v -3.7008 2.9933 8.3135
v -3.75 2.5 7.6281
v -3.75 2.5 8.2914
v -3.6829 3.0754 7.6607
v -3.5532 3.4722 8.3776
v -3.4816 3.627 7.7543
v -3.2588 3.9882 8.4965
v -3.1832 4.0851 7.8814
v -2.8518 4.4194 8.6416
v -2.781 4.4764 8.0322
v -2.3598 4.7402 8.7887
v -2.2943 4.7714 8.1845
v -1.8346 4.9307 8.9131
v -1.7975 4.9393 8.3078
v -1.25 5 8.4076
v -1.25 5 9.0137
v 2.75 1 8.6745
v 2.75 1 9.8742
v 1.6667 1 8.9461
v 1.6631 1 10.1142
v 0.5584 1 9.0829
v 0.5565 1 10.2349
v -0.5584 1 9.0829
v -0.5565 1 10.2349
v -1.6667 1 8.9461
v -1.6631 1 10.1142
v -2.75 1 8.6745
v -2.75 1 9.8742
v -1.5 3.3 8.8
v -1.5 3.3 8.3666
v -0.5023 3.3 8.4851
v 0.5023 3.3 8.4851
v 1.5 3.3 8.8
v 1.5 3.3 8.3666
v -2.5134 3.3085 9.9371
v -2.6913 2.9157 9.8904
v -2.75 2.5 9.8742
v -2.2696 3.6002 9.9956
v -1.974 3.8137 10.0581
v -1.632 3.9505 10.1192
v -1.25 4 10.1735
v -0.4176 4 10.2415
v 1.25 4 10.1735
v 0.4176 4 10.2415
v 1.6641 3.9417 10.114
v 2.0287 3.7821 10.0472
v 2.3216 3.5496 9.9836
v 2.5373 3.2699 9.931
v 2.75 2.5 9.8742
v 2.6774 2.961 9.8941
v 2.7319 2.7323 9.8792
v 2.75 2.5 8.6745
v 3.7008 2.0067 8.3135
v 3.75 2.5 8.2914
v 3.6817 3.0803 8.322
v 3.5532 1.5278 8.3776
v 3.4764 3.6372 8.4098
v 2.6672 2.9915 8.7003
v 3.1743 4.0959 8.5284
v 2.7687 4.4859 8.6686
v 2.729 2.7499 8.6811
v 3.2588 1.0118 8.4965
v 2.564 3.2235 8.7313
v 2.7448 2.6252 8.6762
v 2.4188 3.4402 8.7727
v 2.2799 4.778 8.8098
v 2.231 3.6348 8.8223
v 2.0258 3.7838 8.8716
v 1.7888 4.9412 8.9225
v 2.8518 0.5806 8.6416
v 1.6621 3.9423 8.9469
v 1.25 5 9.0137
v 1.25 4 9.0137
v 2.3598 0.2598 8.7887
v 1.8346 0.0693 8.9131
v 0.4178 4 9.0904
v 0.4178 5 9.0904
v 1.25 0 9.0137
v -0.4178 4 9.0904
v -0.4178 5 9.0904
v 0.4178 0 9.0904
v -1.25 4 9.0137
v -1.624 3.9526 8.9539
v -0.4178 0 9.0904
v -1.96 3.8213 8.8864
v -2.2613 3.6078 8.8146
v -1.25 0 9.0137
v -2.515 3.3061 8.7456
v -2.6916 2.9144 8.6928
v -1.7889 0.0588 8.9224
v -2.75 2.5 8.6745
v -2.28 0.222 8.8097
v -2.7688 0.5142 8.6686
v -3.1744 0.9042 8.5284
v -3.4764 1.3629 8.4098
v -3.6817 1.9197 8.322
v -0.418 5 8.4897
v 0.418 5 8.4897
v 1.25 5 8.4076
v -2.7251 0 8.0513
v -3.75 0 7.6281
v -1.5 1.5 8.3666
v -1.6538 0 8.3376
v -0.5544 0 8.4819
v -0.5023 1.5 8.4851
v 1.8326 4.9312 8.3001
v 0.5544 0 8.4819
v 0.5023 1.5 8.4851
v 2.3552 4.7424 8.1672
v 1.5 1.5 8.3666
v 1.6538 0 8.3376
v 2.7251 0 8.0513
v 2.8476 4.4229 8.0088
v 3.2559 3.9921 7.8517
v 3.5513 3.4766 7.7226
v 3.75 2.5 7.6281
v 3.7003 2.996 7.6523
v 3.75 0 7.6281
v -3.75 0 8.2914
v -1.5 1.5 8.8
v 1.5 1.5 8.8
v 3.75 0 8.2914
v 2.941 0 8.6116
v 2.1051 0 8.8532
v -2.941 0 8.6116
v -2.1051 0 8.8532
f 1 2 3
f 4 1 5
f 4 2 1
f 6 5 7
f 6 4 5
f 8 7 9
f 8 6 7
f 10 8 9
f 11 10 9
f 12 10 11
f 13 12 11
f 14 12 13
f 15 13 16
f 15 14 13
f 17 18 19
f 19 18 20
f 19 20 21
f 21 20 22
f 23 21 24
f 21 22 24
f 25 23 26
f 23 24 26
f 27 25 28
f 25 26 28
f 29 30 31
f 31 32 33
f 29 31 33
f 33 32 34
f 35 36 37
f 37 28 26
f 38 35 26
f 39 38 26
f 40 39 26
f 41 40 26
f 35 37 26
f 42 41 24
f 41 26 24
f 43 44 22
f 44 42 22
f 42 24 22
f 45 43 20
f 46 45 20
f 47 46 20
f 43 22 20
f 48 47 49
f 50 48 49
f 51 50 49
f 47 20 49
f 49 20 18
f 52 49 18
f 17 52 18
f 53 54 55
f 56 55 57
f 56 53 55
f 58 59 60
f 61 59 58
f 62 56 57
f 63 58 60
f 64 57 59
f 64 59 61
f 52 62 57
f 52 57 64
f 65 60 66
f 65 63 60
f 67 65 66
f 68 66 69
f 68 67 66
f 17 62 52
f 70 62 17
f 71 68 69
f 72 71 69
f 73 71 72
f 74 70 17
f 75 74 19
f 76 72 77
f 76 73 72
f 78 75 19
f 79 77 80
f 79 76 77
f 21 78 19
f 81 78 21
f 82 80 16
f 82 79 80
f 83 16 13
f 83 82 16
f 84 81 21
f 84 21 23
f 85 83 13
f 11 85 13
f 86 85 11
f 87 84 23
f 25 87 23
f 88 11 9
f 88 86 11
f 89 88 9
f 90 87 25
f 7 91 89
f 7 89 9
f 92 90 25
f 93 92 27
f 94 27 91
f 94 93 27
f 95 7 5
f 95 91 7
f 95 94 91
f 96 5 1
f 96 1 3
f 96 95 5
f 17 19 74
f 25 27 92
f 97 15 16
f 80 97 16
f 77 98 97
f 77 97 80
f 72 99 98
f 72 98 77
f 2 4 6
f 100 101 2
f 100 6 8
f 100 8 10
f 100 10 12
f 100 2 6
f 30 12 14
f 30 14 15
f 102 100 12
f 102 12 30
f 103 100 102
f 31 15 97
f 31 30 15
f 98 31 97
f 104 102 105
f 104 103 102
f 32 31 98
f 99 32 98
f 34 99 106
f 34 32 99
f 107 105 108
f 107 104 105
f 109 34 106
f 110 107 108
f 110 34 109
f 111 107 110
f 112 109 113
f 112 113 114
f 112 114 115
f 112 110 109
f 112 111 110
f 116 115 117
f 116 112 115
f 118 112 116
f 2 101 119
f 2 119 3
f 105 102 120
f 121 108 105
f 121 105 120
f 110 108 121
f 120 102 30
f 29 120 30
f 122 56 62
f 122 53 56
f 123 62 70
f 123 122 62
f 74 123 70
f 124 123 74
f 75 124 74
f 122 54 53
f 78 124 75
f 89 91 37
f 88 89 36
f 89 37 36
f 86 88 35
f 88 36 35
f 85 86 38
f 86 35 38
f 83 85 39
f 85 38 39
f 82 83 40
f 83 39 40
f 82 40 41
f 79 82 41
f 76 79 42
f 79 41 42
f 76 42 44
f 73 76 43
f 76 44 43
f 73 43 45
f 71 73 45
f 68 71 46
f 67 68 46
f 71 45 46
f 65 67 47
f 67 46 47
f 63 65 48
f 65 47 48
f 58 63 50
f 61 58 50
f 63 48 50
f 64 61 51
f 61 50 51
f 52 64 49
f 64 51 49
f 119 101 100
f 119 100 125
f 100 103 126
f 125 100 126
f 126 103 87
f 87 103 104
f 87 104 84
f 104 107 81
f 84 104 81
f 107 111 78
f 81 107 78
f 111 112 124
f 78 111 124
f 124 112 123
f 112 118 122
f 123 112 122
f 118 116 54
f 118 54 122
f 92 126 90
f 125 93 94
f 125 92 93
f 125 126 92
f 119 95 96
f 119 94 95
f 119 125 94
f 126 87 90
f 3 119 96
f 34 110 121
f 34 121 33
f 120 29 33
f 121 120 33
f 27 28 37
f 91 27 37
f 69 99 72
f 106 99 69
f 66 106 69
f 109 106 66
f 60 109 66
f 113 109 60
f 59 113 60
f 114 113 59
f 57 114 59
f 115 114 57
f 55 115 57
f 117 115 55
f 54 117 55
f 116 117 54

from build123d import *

# Parameters (mm, degrees)
SKETCH1_R               = 10.25
SKETCH1_R_2             = 8.5
BOSS_EXTRUDE1_DEPTH     = 5
CUT_EXTRUDE1_START      = -10.2500001
CUT_EXTRUDE1_OUTLINE_W  = 20.5
CUT_EXTRUDE1_OUTLINE_H  = 5
CUT_EXTRUDE1_DEPTH      = 17.878072963
CUT_EXTRUDE1_START_2    = 7.628072863
CUT_EXTRUDE1_2_DEPTH    = 2.545422212
CUT_EXTRUDE7_REACH      = 26.005
CUT_EXTRUDE7_END_RADIUS = 9.1
CUT_EXTRUDE7_START      = 12
SKETCH3_W               = 3
SKETCH3_H               = 1.8
CUT_EXTRUDE8_DEPTH      = 8.8


# Read off the part's stored shape, not the designer's step: Cut-Extrude1
with BuildPart() as part:
    # Sketch1 → Boss-Extrude1 (new body)
    with BuildSketch(Plane(origin=(0, 0, 0), x_dir=(1, 0, 0), z_dir=(0, 1, 0))):
        with Locations(Location((0, 0, 0), (0, 0, 270))):
            Circle(SKETCH1_R)
        with Locations(Location((0, 0, 0), (0, 0, 270))):
            Circle(SKETCH1_R_2, mode=Mode.SUBTRACT)
    extrude(amount=BOSS_EXTRUDE1_DEPTH)

    # Cut-Extrude1 outline → Cut-Extrude1 (cut)
    with BuildSketch(Plane.XY.offset(CUT_EXTRUDE1_START)):
        with Locations((0, 2.5)):
            Rectangle(CUT_EXTRUDE1_OUTLINE_W, CUT_EXTRUDE1_OUTLINE_H)
    extrude(amount=CUT_EXTRUDE1_DEPTH, mode=Mode.SUBTRACT)

    # Cut-Extrude1 2 outline → Cut-Extrude1 2 (cut)
    with BuildSketch(Plane.XY.offset(CUT_EXTRUDE1_START_2)):
        with BuildLine():
            ThreePointArc((-3.75, 2.5), (-3.017766953, 4.267766953), (-1.25, 5))
            Line((-1.25, 5), (-10.25, 5))
            Line((-10.25, 5), (-10.25, 0))
            Line((-10.25, 0), (-3.75, 0))
            Line((-3.75, 0), (-3.75, 2.5))
        make_face()
        with BuildLine():
            Line((10.25, 5), (1.25, 5))
            ThreePointArc((1.25, 5), (3.017766953, 4.267766953), (3.75, 2.5))
            Line((3.75, 2.5), (3.75, 0))
            Line((3.75, 0), (10.25, 0))
            Line((10.25, 0), (10.25, 5))
        make_face()
    extrude(amount=CUT_EXTRUDE1_2_DEPTH, mode=Mode.SUBTRACT)

    # Cut-Extrude7: up to this cylinder (the profile starts outside it)
    cut_extrude7_end = Plane(origin=(0, 2.7341405, 0), z_dir=(0, -1, 0)) * Cylinder(CUT_EXTRUDE7_END_RADIUS, 75.561441, mode=Mode.PRIVATE)
    # Sketch2<4> → Cut-Extrude7 (cut, up to the surface)
    with BuildSketch(Plane.XY.offset(CUT_EXTRUDE7_START), mode=Mode.PRIVATE) as cut_extrude7_sk1:
        with BuildLine():
            Line((1.25, 5), (-1.25, 5))
            ThreePointArc((-1.25, 5), (-3.017766953, 4.267766953), (-3.75, 2.5))
            ThreePointArc((-3.75, 2.5), (-3.017766953, 0.732233047), (-1.25, 0))
            Line((-1.25, 0), (1.25, 0))
            ThreePointArc((1.25, 0), (3.017766953, 0.732233047), (3.75, 2.5))
            ThreePointArc((3.75, 2.5), (3.017766953, 4.267766953), (1.25, 5))
        make_face()
        with BuildLine():
            ThreePointArc((-2.75, 2.5), (-2.310660172, 3.560660172), (-1.25, 4))
            Line((-1.25, 4), (1.25, 4))
            ThreePointArc((1.25, 4), (2.310660172, 3.560660172), (2.75, 2.5))
            Line((2.75, 2.5), (2.75, 1))
            Line((2.75, 1), (1.25, 1))
            Line((1.25, 1), (-1.25, 1))
            Line((-1.25, 1), (-2.75, 1))
            Line((-2.75, 1), (-2.75, 2.5))
        make_face(mode=Mode.SUBTRACT)
    cut_extrude7_tool1 = extrude(cut_extrude7_sk1.sketch, amount=-CUT_EXTRUDE7_REACH, mode=Mode.PRIVATE) - cut_extrude7_end
    add(cut_extrude7_tool1.solids().sort_by_distance((0, 4.909861, 12))[0], mode=Mode.SUBTRACT)
    # Sketch2<4> → Cut-Extrude7 (cut, up to the surface)
    with BuildSketch(Plane.XY.offset(CUT_EXTRUDE7_START), mode=Mode.PRIVATE) as cut_extrude7_sk2:
        with BuildLine():
            ThreePointArc((-1.25, 0), (-3.017766953, 0.732233047), (-3.75, 2.5))
            Line((-3.75, 2.5), (-3.75, 0))
            Line((-3.75, 0), (-1.25, 0))
        make_face()
    cut_extrude7_tool2 = extrude(cut_extrude7_sk2.sketch, amount=-CUT_EXTRUDE7_REACH, mode=Mode.PRIVATE) - cut_extrude7_end
    add(cut_extrude7_tool2.solids().sort_by_distance((-3.19158, 0.55842, 12))[0], mode=Mode.SUBTRACT)
    # Sketch2<4> → Cut-Extrude7 (cut, up to the surface)
    with BuildSketch(Plane.XY.offset(CUT_EXTRUDE7_START), mode=Mode.PRIVATE) as cut_extrude7_sk3:
        with BuildLine():
            Line((3.75, 0), (3.75, 2.5))
            ThreePointArc((3.75, 2.5), (3.017766953, 0.732233047), (1.25, 0))
            Line((1.25, 0), (3.75, 0))
        make_face()
    cut_extrude7_tool3 = extrude(cut_extrude7_sk3.sketch, amount=-CUT_EXTRUDE7_REACH, mode=Mode.PRIVATE) - cut_extrude7_end
    add(cut_extrude7_tool3.solids().sort_by_distance((3.19158, 0.55842, 12))[0], mode=Mode.SUBTRACT)

    # Sketch3 → Cut-Extrude8 (cut)
    with BuildSketch(Plane.XY):
        with Locations((0, 2.4)):
            Rectangle(SKETCH3_W, SKETCH3_H)
    extrude(amount=CUT_EXTRUDE8_DEPTH, mode=Mode.SUBTRACT)


solid = part.part
